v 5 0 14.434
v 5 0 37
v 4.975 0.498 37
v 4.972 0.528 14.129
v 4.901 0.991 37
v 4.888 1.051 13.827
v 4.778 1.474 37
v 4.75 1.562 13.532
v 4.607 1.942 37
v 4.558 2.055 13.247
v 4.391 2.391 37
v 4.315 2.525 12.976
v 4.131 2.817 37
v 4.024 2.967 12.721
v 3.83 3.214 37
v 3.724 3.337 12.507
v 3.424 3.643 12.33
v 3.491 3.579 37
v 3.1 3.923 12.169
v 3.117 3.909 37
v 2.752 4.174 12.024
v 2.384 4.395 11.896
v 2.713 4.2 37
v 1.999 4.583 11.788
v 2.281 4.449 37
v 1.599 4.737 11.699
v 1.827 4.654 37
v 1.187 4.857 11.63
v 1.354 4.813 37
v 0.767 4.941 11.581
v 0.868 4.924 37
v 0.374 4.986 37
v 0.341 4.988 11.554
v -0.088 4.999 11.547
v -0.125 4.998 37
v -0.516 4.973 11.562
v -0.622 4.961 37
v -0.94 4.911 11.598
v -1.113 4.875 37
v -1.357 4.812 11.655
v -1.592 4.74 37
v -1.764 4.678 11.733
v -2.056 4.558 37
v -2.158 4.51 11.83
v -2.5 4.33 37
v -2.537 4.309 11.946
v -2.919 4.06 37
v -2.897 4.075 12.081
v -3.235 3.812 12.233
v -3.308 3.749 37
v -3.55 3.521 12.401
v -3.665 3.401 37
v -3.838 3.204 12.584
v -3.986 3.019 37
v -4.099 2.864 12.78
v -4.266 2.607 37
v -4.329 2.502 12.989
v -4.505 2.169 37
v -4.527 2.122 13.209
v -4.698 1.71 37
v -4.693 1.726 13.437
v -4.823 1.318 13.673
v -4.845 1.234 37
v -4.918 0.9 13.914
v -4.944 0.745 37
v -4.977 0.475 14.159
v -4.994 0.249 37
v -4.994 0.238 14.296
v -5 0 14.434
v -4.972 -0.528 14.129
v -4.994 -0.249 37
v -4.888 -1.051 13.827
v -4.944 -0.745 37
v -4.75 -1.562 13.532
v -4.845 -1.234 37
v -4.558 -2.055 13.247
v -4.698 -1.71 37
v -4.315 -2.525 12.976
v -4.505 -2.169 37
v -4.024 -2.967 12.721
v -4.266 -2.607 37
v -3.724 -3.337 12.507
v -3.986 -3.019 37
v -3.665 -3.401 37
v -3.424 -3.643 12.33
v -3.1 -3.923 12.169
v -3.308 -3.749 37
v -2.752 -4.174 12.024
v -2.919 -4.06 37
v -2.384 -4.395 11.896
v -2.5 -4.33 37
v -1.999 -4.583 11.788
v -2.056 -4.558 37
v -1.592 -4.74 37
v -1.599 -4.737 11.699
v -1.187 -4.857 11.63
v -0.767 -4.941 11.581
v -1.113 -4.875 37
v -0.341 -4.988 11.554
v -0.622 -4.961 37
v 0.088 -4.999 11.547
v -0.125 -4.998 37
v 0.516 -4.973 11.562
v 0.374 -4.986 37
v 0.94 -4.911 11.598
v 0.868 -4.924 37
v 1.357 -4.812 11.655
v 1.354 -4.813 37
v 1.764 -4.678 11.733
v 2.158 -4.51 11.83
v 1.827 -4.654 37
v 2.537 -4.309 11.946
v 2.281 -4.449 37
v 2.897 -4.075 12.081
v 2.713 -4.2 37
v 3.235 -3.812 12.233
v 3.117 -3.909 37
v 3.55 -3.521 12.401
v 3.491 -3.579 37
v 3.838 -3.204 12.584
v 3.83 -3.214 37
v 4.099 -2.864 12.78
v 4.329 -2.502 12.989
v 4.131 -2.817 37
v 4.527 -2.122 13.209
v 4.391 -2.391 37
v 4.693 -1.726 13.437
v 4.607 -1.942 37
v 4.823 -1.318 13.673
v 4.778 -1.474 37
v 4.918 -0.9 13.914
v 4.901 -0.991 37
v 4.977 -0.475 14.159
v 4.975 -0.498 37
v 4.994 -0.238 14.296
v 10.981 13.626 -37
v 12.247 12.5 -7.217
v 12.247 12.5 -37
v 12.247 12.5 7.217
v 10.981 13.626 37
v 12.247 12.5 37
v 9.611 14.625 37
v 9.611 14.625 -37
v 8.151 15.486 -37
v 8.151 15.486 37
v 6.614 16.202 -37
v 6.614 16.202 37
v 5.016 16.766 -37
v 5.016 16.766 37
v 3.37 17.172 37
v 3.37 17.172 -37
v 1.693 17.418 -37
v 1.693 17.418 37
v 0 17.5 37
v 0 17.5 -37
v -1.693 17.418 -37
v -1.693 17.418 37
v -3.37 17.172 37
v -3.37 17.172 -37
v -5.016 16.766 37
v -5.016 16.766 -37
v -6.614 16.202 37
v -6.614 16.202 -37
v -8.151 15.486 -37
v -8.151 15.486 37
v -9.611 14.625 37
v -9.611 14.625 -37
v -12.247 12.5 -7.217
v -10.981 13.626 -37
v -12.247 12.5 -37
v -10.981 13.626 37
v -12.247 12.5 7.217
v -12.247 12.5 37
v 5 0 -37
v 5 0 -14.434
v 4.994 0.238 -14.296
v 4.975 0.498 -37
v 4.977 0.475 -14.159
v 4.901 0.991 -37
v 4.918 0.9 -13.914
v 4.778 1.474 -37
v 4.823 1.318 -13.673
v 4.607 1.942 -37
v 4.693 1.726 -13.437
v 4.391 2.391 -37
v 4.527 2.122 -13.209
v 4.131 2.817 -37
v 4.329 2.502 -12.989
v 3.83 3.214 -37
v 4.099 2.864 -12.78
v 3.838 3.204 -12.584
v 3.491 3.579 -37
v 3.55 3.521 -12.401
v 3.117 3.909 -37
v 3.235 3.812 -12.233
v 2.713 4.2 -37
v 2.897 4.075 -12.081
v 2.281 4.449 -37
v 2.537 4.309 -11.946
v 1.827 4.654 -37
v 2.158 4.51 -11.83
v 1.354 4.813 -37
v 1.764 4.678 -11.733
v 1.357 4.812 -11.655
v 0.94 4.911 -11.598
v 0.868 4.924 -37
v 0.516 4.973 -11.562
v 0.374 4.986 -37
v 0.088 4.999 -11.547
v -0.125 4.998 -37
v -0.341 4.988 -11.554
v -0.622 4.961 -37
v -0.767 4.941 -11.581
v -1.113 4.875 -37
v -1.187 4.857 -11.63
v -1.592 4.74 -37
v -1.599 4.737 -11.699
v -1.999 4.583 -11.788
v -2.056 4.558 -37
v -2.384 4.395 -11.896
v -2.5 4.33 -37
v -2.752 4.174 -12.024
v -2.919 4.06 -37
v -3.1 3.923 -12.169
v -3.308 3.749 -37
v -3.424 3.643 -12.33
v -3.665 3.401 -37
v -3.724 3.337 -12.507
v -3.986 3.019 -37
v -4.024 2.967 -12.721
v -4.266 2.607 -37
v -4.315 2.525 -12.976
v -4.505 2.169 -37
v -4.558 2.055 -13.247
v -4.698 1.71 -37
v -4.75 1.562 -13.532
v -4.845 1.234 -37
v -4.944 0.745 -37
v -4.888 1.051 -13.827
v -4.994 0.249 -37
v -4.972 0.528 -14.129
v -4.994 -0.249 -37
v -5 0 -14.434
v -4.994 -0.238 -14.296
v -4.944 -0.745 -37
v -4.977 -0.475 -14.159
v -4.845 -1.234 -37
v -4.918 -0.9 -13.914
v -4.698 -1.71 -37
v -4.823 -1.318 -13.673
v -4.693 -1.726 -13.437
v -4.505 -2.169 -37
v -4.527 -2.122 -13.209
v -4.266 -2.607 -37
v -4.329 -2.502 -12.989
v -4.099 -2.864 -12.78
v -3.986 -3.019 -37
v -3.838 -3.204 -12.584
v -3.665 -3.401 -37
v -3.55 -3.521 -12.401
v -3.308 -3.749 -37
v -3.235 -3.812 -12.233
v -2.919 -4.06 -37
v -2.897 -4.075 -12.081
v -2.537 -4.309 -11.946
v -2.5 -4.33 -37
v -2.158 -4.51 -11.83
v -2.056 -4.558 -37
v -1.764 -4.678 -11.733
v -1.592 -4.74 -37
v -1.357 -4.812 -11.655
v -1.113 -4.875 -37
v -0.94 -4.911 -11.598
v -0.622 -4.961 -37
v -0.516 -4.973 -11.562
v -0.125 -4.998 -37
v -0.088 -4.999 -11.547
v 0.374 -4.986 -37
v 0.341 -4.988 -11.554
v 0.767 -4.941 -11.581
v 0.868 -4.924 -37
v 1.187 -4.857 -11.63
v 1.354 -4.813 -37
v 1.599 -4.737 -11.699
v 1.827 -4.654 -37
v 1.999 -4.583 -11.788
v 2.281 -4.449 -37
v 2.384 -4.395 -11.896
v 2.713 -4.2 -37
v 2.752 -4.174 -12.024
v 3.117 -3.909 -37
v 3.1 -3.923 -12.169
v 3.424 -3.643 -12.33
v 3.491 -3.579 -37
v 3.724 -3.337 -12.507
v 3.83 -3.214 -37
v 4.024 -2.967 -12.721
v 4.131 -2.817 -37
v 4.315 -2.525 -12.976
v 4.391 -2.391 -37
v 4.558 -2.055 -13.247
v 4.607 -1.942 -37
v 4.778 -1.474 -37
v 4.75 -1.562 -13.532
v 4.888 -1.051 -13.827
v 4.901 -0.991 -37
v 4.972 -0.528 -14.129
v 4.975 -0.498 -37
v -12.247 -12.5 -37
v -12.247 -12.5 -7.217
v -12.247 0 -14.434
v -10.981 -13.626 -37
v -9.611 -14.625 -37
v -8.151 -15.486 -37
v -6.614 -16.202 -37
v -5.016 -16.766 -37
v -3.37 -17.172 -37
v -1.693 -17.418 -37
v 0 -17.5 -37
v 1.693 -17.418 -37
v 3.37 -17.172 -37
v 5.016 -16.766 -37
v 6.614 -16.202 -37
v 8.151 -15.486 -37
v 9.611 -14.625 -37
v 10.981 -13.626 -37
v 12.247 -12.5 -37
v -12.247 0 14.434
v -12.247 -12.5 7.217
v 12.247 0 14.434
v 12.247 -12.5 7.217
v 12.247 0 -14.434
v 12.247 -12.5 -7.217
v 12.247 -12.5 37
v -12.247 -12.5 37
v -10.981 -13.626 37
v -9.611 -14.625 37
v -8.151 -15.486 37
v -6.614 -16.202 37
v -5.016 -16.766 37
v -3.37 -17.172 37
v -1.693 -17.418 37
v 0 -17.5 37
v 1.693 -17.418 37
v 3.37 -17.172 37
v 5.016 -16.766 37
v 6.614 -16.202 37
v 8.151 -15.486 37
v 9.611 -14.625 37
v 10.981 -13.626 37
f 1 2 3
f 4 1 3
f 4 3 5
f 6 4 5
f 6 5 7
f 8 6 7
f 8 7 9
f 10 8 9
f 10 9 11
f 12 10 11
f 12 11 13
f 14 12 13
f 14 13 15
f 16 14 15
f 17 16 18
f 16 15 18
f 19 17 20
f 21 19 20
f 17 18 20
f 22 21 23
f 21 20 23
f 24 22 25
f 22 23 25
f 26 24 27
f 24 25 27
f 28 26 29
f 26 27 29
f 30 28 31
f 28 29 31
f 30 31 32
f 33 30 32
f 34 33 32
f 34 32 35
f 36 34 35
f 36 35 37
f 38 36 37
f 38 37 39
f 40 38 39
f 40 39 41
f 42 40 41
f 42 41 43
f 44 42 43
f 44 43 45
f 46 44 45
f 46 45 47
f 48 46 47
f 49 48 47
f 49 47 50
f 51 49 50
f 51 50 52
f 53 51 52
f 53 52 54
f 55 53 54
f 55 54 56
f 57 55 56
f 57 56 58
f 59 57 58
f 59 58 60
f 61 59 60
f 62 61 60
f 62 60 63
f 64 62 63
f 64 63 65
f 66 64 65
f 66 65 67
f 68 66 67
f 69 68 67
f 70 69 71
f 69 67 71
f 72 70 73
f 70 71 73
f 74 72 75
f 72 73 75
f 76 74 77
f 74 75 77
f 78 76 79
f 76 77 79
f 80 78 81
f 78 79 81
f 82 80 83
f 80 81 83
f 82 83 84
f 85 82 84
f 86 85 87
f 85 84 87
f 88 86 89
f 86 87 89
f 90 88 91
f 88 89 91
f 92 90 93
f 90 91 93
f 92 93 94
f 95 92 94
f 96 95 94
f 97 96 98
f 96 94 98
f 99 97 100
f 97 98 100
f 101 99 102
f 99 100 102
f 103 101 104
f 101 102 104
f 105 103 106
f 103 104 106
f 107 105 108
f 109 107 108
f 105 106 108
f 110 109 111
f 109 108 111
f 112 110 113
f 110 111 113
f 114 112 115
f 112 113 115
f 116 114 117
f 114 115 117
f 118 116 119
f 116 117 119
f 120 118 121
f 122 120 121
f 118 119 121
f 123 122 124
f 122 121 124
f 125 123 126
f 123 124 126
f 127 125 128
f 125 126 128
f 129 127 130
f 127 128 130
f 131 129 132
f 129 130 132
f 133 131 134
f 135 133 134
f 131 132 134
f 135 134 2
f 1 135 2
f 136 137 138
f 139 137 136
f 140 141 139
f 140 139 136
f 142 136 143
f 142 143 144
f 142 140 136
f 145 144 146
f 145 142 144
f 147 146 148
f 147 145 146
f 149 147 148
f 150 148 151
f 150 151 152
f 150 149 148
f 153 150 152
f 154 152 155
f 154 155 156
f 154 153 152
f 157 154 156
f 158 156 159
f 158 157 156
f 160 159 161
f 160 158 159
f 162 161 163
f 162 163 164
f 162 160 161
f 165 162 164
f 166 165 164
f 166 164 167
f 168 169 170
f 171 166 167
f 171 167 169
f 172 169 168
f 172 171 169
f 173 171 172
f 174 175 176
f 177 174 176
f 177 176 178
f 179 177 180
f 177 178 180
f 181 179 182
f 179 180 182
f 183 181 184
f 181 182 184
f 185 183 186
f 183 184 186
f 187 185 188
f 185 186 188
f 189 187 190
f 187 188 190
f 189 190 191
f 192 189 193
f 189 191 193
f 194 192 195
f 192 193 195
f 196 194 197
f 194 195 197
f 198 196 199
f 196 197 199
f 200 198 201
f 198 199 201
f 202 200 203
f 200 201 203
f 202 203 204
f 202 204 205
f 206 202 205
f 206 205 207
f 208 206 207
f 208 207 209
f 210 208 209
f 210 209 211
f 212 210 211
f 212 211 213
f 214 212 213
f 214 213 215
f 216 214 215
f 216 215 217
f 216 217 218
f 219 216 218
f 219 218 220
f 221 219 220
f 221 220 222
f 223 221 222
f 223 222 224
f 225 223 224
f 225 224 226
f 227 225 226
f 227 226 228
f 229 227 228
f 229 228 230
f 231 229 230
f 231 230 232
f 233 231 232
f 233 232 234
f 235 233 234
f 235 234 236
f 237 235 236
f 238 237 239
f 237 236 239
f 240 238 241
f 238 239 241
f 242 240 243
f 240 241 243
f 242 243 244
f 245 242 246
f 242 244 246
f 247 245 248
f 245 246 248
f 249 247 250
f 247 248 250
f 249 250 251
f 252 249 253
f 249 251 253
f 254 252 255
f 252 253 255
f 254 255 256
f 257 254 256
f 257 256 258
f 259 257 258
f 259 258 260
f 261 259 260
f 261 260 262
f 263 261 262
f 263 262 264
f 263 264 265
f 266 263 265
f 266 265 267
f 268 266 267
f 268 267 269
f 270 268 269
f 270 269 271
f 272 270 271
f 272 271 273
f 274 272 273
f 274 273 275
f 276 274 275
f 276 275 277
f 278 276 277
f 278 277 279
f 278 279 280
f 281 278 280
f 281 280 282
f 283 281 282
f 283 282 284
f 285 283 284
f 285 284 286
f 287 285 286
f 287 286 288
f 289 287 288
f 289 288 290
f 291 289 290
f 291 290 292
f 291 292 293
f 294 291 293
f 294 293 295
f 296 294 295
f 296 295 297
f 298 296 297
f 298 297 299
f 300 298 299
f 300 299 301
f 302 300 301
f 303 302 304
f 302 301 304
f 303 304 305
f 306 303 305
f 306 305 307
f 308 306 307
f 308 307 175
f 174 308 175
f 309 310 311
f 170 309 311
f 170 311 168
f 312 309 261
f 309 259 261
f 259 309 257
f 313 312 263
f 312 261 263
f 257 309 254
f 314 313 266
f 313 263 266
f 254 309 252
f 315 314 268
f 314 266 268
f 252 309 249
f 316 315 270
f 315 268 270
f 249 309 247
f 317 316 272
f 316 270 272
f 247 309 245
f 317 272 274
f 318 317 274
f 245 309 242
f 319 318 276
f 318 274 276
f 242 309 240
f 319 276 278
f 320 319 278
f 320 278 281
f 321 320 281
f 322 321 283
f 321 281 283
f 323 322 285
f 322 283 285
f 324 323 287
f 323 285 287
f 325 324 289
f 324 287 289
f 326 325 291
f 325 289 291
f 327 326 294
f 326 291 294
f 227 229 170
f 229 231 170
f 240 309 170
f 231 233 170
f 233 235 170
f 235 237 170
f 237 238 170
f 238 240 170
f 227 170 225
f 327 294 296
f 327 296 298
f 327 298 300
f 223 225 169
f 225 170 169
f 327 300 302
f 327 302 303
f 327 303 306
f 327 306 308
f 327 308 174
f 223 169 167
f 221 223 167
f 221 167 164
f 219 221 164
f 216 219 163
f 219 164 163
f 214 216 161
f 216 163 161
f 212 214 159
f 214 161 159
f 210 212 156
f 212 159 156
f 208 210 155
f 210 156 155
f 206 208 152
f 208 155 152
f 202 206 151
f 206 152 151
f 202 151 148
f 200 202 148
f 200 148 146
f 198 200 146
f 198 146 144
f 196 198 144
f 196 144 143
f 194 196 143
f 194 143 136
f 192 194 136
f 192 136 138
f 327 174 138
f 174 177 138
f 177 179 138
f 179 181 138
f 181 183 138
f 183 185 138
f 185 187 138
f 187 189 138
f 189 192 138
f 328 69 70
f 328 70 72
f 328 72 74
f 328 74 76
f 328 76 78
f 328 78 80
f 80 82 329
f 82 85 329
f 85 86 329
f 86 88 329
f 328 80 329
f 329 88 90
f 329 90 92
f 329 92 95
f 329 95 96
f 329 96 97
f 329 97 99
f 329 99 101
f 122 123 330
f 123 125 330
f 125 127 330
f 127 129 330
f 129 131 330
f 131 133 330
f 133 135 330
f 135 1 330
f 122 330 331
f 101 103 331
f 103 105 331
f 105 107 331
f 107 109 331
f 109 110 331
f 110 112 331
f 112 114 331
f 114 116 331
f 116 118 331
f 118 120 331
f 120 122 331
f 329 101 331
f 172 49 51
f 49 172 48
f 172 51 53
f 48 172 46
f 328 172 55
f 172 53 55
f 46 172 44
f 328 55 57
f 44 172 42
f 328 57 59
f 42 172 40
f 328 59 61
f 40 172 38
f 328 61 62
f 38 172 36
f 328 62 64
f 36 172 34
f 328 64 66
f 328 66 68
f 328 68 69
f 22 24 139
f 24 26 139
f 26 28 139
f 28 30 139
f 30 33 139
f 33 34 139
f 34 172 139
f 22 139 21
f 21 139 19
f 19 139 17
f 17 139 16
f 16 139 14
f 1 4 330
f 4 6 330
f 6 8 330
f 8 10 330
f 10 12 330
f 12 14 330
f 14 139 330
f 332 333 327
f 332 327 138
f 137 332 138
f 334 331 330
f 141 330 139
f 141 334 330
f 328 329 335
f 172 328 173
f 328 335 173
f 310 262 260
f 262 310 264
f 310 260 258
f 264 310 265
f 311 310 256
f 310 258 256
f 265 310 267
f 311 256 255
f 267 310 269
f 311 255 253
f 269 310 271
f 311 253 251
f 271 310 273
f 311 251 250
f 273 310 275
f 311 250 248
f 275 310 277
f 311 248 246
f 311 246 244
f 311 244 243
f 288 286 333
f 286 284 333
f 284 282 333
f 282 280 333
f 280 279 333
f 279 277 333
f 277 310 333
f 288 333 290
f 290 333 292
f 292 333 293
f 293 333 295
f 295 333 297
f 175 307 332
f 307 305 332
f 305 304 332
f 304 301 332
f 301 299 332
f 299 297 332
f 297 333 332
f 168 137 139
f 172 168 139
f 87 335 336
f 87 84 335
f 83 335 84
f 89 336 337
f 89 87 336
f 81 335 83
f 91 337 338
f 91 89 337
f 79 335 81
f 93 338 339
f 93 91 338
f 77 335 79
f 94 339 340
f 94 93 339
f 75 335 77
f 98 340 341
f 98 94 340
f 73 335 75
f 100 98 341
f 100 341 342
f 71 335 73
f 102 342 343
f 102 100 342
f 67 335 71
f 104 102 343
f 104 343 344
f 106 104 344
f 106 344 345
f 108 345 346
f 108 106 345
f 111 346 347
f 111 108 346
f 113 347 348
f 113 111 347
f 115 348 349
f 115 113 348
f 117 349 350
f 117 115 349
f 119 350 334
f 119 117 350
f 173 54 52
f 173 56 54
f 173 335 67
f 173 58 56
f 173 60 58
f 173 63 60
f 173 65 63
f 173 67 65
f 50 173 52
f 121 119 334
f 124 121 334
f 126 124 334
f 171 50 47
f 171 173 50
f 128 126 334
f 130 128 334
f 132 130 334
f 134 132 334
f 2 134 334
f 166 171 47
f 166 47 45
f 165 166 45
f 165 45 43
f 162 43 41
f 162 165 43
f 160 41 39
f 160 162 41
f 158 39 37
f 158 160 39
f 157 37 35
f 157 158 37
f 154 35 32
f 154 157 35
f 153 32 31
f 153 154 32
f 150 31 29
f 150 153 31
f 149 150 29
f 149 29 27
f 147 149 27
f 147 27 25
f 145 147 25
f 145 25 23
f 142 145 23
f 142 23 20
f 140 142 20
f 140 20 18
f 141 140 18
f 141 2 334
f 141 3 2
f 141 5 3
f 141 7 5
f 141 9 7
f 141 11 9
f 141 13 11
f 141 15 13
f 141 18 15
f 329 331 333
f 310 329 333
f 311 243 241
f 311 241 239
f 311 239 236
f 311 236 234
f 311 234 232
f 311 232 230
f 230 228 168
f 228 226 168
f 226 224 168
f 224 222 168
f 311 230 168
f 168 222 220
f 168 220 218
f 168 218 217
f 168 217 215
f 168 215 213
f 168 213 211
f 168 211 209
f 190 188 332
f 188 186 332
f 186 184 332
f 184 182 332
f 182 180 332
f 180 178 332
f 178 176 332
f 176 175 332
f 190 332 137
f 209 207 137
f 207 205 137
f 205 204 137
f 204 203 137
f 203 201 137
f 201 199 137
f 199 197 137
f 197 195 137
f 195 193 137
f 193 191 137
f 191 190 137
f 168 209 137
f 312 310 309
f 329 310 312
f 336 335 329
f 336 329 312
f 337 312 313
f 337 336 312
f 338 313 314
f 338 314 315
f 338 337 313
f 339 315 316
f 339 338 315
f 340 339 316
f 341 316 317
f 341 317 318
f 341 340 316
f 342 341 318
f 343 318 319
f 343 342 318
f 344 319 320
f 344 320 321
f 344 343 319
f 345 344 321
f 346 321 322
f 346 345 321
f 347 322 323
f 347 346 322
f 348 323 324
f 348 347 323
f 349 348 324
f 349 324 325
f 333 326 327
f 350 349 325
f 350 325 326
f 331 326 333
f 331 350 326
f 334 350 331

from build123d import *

# Parameters (mm, degrees)
SKETCH1_R           = 17.5
BOSS_EXTRUDE1_DEPTH = 37
SKETCH3_W           = 21.176447949
SKETCH3_H           = 25
CUT_EXTRUDE1_DEPTH  = 74
SKETCH4_R           = 5
CUT_EXTRUDE2_DEPTH  = 74
CUT_EXTRUDE3_DEPTH  = 74


with BuildPart() as part:
    # Sketch1 → Boss-Extrude1 (new, symmetric)
    with BuildSketch(Plane.XY):
        Circle(SKETCH1_R)
    extrude(amount=BOSS_EXTRUDE1_DEPTH, both=True)

    # Sketch3 → Cut-Extrude1 (cut)
    with BuildSketch(Plane.XY.offset(37)):
        with Locations((-22.835672689, 0)):
            Rectangle(SKETCH3_W, SKETCH3_H)
        with Locations((22.835672689, 0)):
            Rectangle(SKETCH3_W, SKETCH3_H)
    extrude(amount=-CUT_EXTRUDE1_DEPTH, mode=Mode.SUBTRACT)

    # Sketch4 → Cut-Extrude2 (cut)
    with BuildSketch(Plane.XY.offset(37)):
        Circle(SKETCH4_R)
    extrude(amount=-CUT_EXTRUDE2_DEPTH, mode=Mode.SUBTRACT)

    # Sketch5 → Cut-Extrude3 (cut)
    with BuildSketch(Plane(origin=(12.247448714, 0, 0), x_dir=(0, 0, -1), z_dir=(1, 0, 0))):
        Polygon((14.43375673, 0), (7.216878365, 12.5), (-7.216878365, 12.5), (-14.43375673, 0), (-7.216878365, -12.5), (7.216878365, -12.5), align=None)
    extrude(amount=-CUT_EXTRUDE3_DEPTH, mode=Mode.SUBTRACT)


solid = part.part
